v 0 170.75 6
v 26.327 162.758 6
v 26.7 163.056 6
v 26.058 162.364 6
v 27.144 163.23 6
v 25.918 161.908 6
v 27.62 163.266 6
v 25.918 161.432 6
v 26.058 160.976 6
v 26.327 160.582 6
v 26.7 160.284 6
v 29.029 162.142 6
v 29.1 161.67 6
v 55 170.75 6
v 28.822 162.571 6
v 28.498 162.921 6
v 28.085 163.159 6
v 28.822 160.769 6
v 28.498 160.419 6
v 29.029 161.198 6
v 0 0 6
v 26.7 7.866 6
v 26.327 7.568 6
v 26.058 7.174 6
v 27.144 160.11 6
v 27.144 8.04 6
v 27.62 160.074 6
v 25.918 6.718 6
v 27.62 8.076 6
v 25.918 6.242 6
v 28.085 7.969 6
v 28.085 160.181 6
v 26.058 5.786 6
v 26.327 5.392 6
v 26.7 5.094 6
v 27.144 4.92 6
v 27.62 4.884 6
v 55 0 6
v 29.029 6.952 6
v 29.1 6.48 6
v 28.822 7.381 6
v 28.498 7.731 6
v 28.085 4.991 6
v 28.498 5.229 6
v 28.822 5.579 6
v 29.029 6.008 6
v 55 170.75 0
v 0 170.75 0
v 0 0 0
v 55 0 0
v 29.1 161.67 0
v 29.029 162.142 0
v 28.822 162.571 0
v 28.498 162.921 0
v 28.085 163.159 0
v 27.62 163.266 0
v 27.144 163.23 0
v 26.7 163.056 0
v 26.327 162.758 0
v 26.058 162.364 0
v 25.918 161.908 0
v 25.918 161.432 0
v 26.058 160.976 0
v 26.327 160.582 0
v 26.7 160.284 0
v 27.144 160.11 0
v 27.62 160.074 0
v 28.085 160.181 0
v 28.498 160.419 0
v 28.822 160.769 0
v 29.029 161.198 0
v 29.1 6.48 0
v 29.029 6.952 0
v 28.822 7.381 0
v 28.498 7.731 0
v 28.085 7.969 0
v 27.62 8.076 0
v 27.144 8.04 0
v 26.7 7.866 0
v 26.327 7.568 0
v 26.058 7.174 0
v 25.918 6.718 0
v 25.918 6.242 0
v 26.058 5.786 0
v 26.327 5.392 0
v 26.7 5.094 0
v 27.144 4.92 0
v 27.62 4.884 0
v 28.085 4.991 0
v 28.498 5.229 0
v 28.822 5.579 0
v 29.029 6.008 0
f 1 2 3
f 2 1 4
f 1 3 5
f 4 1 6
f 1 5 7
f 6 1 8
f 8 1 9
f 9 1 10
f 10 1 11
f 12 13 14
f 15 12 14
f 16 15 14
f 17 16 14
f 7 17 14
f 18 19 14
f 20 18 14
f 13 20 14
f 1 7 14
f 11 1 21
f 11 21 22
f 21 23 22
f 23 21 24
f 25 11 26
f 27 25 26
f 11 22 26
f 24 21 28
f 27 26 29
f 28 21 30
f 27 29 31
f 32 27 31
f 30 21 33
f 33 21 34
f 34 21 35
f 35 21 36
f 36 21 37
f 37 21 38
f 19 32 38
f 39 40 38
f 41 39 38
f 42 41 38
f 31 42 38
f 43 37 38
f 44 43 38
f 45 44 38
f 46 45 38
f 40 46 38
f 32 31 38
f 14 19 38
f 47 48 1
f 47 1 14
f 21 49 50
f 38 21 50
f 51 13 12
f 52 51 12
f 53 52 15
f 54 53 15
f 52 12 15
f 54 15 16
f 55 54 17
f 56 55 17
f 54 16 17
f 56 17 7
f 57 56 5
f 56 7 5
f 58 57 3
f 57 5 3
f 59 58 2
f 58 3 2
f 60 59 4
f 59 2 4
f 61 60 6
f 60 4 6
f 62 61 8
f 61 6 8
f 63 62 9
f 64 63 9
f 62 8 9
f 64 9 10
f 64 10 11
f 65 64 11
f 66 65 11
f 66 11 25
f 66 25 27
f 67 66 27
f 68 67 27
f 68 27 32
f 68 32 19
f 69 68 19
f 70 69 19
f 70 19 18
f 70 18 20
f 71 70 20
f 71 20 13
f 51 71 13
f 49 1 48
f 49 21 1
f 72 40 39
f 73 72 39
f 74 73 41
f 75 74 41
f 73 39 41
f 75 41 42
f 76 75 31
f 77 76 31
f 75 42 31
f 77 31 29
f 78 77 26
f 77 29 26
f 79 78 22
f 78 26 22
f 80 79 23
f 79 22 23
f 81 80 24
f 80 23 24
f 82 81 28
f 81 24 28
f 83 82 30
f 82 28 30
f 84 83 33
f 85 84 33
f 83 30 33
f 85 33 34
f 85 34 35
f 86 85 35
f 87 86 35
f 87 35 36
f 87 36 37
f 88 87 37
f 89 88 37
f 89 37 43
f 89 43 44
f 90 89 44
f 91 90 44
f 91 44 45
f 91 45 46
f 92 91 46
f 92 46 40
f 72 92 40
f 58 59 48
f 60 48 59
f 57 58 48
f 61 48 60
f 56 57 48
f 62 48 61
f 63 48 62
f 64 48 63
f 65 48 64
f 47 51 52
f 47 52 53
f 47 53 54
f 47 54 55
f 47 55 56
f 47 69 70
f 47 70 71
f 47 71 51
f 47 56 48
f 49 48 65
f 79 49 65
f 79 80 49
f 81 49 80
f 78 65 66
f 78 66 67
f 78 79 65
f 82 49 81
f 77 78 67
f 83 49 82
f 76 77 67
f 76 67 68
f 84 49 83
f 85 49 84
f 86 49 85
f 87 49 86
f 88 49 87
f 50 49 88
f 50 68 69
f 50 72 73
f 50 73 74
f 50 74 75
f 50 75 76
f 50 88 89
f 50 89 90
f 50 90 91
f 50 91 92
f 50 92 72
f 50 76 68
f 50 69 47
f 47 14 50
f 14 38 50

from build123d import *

# Parameters (mm, degrees)
SKETCH1_W            = 55
SKETCH1_H            = 164.75
BOSS_EXTRUDE1_DEPTH  = 6
M3_CLEARANCE_SLOT1_D = 3.2
SKETCH4_W            = 55
SKETCH4_H            = 6
BOSS_EXTRUDE2_DEPTH  = 6


with BuildPart() as part:
    # Sketch1 → Boss-Extrude1 (new body)
    with BuildSketch(Plane.XY):
        with Locations((27.5, 82.375)):
            Rectangle(SKETCH1_W, SKETCH1_H)
    extrude(amount=BOSS_EXTRUDE1_DEPTH)

    # M3 Clearance Slot1 (through all)
    with Locations(Plane(origin=(0, 0, 0), x_dir=(-1, 0, 0), z_dir=(0, 0, -1))):
        with Locations((-27.5, 161.67), (-27.5, 6.48)):
            Hole(M3_CLEARANCE_SLOT1_D / 2)

    # Sketch4 → Boss-Extrude2 (add)
    with BuildSketch(Plane(origin=(0, 164.75, 0), x_dir=(1, 0, 0), z_dir=(0, 1, 0))):
        with Locations((27.5, -3)):
            Rectangle(SKETCH4_W, SKETCH4_H)
    extrude(amount=BOSS_EXTRUDE2_DEPTH)


solid = part.part
